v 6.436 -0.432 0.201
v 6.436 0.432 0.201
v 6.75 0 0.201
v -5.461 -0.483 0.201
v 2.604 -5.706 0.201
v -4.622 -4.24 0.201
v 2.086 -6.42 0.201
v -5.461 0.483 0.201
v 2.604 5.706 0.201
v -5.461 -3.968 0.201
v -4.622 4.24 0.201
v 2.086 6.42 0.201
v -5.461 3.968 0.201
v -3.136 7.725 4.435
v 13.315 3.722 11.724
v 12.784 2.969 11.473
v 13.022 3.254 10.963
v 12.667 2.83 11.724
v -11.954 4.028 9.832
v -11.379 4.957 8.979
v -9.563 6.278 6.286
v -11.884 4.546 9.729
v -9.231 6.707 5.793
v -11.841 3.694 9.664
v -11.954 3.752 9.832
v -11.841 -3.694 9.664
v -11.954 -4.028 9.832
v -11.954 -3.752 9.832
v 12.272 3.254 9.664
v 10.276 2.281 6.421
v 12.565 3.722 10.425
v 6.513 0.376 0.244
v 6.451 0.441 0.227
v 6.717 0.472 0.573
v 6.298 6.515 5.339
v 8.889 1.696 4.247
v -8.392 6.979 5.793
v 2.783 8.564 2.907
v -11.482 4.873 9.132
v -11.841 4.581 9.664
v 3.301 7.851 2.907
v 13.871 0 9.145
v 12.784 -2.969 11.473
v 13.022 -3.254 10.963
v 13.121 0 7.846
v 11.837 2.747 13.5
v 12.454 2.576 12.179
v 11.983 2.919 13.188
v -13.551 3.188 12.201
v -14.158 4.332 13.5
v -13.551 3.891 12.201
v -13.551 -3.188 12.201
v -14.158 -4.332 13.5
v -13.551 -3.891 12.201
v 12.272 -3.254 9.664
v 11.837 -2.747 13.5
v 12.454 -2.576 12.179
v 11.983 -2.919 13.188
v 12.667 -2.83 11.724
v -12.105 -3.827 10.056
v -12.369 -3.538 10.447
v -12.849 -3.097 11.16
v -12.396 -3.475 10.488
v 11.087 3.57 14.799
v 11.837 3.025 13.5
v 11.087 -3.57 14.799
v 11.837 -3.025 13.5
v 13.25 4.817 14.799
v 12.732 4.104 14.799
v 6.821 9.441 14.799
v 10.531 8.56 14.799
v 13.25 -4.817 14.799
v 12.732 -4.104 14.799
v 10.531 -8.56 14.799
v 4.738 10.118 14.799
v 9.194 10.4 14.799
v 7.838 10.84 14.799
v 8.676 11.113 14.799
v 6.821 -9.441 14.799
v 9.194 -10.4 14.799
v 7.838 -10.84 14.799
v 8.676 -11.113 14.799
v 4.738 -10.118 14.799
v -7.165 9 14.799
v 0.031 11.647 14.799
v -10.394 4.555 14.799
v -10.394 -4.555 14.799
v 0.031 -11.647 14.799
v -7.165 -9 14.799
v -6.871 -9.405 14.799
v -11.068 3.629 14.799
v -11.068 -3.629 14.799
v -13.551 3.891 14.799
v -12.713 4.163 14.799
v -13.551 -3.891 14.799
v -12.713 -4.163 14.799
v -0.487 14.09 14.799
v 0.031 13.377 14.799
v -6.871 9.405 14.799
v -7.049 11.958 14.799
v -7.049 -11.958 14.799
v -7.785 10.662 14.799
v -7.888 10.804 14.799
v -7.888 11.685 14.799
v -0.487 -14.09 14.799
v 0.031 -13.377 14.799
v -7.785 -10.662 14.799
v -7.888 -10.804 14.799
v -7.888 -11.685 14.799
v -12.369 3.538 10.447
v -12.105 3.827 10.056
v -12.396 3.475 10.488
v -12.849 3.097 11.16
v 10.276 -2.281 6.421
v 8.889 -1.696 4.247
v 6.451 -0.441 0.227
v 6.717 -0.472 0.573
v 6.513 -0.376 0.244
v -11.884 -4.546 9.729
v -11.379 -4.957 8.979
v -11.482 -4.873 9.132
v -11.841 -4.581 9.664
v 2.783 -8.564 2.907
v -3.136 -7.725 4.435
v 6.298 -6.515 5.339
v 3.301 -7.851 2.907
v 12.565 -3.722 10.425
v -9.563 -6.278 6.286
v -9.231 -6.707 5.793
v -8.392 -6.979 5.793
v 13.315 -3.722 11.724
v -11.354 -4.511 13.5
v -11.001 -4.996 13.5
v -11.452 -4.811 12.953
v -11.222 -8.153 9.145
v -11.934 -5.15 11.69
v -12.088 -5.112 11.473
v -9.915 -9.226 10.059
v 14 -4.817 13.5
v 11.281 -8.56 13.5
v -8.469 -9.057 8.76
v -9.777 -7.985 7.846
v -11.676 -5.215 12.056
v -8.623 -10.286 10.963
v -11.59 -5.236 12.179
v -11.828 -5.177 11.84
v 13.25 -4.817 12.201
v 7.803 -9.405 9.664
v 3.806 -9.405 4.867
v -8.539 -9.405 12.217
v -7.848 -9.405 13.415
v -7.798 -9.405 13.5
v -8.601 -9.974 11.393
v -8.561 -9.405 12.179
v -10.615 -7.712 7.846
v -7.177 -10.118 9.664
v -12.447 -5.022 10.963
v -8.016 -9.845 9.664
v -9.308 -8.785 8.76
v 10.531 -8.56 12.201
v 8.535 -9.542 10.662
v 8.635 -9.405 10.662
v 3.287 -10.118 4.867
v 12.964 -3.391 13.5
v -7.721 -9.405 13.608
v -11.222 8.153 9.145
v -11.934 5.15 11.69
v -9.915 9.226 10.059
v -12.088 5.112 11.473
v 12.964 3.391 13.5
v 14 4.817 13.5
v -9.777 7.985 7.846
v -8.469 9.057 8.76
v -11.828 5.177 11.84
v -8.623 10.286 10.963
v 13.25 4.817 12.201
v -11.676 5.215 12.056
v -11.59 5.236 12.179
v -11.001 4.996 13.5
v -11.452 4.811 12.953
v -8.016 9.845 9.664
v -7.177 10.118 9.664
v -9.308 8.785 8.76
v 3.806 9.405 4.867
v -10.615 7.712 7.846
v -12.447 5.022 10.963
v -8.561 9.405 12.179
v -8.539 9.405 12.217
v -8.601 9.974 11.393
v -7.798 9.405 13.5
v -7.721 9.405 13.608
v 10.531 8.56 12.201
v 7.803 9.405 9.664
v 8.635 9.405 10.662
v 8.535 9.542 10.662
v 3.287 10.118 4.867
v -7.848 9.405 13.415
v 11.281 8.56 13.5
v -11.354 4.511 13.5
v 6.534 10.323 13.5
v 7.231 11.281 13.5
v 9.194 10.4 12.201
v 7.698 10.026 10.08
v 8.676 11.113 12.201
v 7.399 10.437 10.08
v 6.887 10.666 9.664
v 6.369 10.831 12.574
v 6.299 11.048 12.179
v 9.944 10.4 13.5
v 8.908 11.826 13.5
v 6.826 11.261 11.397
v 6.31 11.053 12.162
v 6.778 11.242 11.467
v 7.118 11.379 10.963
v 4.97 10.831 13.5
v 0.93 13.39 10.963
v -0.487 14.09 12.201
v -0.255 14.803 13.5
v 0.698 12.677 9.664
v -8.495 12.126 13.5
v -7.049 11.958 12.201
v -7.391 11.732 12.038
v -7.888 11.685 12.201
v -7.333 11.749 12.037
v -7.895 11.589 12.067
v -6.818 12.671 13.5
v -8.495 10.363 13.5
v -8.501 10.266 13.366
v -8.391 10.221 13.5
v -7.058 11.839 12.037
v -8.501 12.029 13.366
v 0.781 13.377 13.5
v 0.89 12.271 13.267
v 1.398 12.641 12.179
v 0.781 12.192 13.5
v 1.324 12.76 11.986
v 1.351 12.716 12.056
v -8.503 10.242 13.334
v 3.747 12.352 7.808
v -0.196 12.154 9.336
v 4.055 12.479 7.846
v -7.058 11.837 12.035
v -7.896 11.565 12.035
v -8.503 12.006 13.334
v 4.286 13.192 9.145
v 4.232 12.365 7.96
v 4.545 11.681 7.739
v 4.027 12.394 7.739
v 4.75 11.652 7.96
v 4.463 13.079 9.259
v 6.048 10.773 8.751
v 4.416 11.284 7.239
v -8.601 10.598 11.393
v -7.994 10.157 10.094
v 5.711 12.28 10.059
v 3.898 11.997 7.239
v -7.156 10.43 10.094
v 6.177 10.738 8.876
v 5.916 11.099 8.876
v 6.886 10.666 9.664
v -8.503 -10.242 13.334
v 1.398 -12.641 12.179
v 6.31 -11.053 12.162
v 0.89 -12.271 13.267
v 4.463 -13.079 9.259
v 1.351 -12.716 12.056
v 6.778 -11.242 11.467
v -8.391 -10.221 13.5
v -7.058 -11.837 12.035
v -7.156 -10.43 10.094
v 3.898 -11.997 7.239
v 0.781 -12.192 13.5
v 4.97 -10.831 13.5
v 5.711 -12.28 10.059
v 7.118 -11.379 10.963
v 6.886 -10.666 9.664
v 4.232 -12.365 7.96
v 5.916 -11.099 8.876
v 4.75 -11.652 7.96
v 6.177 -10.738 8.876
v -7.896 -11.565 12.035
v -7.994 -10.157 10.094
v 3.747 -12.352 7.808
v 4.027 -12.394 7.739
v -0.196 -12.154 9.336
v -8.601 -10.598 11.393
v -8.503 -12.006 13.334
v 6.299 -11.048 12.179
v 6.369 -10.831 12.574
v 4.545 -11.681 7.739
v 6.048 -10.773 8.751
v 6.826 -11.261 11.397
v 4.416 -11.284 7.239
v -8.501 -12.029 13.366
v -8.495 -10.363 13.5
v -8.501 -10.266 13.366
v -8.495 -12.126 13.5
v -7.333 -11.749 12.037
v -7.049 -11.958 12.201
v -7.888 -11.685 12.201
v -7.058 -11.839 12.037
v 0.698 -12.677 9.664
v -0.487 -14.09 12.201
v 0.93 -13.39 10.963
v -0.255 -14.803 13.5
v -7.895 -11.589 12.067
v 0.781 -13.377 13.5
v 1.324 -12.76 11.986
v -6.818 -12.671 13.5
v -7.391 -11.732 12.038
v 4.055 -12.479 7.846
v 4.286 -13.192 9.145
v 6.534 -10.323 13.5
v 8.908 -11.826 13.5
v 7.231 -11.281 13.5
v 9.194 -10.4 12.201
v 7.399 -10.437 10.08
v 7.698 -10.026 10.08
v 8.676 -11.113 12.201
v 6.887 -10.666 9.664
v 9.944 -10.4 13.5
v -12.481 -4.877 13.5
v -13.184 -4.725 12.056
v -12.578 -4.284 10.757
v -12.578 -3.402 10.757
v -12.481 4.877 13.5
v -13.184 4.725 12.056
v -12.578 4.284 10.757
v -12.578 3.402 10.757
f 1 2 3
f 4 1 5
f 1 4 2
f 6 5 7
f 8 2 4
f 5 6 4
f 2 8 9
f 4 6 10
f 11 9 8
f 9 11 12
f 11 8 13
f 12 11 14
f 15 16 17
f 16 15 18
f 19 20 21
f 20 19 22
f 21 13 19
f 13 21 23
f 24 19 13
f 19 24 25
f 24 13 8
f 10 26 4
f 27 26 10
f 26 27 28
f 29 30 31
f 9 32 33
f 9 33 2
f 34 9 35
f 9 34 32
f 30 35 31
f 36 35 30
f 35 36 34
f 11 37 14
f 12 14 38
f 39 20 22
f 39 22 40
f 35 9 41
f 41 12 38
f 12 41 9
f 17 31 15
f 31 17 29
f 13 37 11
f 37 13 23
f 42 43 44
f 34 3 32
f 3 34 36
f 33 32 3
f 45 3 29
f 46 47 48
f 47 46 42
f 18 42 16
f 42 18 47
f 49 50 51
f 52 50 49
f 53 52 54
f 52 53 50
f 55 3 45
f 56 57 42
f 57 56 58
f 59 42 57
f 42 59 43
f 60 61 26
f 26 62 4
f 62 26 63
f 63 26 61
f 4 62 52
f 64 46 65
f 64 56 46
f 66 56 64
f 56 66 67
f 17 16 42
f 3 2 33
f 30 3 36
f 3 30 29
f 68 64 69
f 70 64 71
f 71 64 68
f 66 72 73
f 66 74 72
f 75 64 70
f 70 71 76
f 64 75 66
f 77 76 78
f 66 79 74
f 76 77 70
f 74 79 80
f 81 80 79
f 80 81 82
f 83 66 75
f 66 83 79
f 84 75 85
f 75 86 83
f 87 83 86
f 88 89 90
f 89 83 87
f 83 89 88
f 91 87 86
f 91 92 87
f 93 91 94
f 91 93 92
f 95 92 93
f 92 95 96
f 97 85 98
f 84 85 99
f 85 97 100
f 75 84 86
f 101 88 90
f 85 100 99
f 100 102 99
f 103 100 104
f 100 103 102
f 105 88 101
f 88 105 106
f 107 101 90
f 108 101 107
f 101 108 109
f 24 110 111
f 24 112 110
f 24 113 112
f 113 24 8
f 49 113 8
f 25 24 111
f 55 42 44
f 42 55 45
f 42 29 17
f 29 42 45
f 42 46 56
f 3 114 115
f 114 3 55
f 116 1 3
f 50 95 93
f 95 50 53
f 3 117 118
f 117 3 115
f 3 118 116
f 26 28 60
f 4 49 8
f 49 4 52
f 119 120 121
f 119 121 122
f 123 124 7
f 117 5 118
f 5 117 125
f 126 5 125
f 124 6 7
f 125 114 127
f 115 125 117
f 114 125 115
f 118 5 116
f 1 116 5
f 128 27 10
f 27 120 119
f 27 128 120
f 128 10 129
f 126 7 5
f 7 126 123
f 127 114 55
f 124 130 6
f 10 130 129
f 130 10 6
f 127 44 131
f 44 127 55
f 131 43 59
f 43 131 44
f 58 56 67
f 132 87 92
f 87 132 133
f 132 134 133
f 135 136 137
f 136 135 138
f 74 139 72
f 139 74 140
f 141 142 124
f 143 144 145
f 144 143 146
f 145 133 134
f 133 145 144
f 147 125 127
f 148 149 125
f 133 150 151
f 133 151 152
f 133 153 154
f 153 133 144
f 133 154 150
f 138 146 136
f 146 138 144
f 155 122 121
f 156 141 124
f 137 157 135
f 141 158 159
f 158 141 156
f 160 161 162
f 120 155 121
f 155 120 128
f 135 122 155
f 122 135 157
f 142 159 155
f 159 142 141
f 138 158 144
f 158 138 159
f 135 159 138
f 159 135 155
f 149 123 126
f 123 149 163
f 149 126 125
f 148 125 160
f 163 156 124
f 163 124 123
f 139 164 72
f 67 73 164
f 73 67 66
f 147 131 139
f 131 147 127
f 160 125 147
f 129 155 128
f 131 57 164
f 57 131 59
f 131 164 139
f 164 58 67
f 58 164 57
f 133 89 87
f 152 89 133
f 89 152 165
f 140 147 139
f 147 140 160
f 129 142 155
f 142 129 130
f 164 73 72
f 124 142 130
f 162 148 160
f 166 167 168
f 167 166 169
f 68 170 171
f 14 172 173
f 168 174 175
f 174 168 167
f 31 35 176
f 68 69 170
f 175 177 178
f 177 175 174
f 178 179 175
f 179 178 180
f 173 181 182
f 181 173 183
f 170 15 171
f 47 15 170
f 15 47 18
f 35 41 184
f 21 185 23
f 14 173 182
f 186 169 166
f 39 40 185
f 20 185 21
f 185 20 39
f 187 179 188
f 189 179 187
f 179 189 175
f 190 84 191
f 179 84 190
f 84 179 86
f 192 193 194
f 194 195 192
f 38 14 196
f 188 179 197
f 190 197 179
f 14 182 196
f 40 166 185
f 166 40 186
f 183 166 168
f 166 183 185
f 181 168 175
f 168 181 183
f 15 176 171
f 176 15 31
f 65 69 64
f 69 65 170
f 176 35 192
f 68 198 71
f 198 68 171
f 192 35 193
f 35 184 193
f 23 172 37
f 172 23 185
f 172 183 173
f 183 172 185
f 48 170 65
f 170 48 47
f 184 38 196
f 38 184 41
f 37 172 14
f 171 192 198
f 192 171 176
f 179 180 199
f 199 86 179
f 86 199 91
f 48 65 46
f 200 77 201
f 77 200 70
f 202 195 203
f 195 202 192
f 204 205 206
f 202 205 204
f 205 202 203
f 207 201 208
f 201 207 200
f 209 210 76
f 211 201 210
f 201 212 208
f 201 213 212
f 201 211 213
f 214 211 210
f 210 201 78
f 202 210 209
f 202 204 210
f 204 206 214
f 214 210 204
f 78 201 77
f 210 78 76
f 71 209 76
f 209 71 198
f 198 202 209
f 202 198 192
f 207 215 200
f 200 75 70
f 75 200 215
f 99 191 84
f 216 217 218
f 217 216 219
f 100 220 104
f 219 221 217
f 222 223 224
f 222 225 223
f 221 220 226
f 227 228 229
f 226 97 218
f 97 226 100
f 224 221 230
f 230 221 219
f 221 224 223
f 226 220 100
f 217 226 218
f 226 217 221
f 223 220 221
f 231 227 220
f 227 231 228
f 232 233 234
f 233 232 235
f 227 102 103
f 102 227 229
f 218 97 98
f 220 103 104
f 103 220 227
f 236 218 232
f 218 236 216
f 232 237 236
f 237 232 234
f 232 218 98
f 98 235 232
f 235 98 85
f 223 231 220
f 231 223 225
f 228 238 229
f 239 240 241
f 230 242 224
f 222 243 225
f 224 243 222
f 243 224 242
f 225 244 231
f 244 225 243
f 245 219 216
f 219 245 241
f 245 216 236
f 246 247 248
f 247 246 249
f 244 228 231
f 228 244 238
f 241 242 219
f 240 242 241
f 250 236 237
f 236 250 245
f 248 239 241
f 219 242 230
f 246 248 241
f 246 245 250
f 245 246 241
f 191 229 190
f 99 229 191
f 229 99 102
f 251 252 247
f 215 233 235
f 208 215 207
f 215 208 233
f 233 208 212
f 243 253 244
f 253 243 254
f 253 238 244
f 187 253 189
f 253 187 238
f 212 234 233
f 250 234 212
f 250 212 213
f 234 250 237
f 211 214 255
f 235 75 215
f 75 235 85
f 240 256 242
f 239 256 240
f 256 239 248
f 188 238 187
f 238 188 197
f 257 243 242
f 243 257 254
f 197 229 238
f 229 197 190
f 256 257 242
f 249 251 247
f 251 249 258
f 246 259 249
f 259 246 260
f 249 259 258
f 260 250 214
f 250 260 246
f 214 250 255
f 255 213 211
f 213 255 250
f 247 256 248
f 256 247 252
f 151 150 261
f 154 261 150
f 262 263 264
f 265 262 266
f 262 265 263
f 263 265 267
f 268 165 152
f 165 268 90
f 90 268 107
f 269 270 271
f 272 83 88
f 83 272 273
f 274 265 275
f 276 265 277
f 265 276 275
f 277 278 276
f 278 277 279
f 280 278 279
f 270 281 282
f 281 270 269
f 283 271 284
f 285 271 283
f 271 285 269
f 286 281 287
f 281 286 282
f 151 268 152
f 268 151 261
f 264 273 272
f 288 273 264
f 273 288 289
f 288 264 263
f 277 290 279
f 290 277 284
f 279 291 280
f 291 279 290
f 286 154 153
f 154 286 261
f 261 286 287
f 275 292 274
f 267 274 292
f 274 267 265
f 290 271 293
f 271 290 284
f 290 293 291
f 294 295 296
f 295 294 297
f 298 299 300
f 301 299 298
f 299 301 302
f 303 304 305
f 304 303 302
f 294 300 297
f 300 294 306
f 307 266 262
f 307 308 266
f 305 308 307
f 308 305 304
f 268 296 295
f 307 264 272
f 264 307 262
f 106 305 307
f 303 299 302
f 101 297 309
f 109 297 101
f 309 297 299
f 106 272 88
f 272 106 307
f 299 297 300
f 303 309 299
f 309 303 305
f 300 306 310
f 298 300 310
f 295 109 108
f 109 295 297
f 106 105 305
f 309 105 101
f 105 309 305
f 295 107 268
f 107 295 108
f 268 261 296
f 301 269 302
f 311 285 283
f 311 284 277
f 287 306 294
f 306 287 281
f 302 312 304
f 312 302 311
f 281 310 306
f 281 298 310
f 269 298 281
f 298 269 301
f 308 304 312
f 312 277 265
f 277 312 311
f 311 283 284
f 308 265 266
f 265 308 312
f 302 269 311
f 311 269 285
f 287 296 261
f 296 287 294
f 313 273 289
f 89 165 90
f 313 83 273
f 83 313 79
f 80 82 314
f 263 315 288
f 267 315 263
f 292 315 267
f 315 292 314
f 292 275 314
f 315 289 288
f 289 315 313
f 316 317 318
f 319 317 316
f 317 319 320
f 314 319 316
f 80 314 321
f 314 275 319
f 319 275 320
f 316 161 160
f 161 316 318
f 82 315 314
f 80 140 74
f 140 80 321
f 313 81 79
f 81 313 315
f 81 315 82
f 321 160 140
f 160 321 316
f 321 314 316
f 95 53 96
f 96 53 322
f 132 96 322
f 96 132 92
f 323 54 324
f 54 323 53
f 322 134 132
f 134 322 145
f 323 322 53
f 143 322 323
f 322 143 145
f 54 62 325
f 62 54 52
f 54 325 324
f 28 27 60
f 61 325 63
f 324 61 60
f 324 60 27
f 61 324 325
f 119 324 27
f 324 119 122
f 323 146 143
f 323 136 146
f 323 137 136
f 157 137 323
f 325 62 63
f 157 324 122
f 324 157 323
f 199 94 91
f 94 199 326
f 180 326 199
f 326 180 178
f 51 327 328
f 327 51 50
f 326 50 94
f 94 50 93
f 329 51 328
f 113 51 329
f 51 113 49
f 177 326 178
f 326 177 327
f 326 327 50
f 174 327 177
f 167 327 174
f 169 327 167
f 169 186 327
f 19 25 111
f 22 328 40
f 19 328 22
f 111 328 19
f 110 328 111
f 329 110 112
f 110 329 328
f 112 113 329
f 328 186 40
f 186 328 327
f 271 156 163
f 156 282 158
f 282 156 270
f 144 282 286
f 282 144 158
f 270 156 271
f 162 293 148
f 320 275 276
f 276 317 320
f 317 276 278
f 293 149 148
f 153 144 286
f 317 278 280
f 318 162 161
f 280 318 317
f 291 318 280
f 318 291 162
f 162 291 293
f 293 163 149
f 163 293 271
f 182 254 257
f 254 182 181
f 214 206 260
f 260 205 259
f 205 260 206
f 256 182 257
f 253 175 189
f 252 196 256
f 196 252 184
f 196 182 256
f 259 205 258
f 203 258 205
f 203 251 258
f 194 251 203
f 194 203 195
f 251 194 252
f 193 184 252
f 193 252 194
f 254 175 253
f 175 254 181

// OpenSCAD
dM4 = 4.1;
dtM4 = 8.1;
ddM4 = 8;

dM3 = 3.1;

dL3 = 2.1;
dtL3 = 6.3;

knob();

module griglia(passo, duty, Mm, h, rot=0, nega=false){

	/* Genera una grigli, tagliandola ai bordi della superficie bidimensionale passata come children
	Esempio:
	griglia(5, 3, 22, 2)
		circle(r=10);

	Genera una griglia circolare di raggio 10mm. Le sbarre saranno spesse 3mm e i buchi 2mm.

	Impostando nega = true si ottiene la figura complementare, piena dove ci sono i buchi e vuota
	nelle sbarre.
	*/

	s = passo-duty;
	rip = Mm/passo;

	if(nega){
		difference(){
			linear_extrude(h)
				children(0);

			translate(0, 0, -1)
				griglia(passo, duty, Mm, h+2, rot, false)
					children(0);
		}
	}else{
		intersection(){

			//translate([(Mm)/2, Mm/2])
				linear_extrude(h, twist=rot, convexity=10){
					//translate([-(Mm)/2, -Mm/2])
						union(){
							for(i = [0:rip]){
								translate([0, i*passo, 0])
									square([Mm+s, s]);
							}
							for(i = [0:rip]){
								translate([i*passo, 0, 0])
									square([s, Mm]);
							}
						}
				}

			translate(0, 0, -1)
				linear_extrude(h+2)
					children(0);
		}
	}
}

module knob(	D = 35,
							d = 15,
							h = 15,
							n_aletz = 5,
							r_aletz = 7,
							r_min = 1.5,
							fn = 5){
	// MASSIMO fn CONSIGLIATO = 10!!
	$fn = fn;
	a = 360/n_aletz;
	D = D-2*r_min;
	d = d-2*r_min;
	h = h-2*r_min;

	tr(0, 0, h+r_min, 180)
	minkowski() {
		// Genera la forma dello knob
		d(){
			cone(D, d, h);
			for(i=[1:n_aletz])
				r(0, 0, i*a)t(D/2)
					sphere(r_aletz);
		}

		// Lo arrotonda
		if(r_min > 0)
			sphere(r_min);
	}
}

module cone(d1, d2, h){
	cylinder(d1=d1, d2=d2, h=h);
}

module anello(d_in, d_out, h){
	d(){
		cy(d_out, h);
		tz()
			cy(d_in, h+2);
	}
}

module cy(d, h){
	cylinder(d=d, h=h);
}

module c(x, y, z=1, center = false){
	cube([x, y, z], center=center);
}

module d(){
	difference(){
		children(0);
		children([1:$children-1]);
	}
}

module tz(z=-1){
	t(0, 0, z)
		children([0:$children-1]);
}

module t(x=0, y=0, z=0){
	translate([x, y, z])
		children([0:$children-1]);
}

module r(x=0, y=0, z=0){
	rotate([x, y, z])
		children([0:$children-1]);
}

module tr(x=0, y=0, z=0, a=0, b=0, c=0){
	t(x, y, z) r(a, b, c)
		children([0:$children-1]);
}
